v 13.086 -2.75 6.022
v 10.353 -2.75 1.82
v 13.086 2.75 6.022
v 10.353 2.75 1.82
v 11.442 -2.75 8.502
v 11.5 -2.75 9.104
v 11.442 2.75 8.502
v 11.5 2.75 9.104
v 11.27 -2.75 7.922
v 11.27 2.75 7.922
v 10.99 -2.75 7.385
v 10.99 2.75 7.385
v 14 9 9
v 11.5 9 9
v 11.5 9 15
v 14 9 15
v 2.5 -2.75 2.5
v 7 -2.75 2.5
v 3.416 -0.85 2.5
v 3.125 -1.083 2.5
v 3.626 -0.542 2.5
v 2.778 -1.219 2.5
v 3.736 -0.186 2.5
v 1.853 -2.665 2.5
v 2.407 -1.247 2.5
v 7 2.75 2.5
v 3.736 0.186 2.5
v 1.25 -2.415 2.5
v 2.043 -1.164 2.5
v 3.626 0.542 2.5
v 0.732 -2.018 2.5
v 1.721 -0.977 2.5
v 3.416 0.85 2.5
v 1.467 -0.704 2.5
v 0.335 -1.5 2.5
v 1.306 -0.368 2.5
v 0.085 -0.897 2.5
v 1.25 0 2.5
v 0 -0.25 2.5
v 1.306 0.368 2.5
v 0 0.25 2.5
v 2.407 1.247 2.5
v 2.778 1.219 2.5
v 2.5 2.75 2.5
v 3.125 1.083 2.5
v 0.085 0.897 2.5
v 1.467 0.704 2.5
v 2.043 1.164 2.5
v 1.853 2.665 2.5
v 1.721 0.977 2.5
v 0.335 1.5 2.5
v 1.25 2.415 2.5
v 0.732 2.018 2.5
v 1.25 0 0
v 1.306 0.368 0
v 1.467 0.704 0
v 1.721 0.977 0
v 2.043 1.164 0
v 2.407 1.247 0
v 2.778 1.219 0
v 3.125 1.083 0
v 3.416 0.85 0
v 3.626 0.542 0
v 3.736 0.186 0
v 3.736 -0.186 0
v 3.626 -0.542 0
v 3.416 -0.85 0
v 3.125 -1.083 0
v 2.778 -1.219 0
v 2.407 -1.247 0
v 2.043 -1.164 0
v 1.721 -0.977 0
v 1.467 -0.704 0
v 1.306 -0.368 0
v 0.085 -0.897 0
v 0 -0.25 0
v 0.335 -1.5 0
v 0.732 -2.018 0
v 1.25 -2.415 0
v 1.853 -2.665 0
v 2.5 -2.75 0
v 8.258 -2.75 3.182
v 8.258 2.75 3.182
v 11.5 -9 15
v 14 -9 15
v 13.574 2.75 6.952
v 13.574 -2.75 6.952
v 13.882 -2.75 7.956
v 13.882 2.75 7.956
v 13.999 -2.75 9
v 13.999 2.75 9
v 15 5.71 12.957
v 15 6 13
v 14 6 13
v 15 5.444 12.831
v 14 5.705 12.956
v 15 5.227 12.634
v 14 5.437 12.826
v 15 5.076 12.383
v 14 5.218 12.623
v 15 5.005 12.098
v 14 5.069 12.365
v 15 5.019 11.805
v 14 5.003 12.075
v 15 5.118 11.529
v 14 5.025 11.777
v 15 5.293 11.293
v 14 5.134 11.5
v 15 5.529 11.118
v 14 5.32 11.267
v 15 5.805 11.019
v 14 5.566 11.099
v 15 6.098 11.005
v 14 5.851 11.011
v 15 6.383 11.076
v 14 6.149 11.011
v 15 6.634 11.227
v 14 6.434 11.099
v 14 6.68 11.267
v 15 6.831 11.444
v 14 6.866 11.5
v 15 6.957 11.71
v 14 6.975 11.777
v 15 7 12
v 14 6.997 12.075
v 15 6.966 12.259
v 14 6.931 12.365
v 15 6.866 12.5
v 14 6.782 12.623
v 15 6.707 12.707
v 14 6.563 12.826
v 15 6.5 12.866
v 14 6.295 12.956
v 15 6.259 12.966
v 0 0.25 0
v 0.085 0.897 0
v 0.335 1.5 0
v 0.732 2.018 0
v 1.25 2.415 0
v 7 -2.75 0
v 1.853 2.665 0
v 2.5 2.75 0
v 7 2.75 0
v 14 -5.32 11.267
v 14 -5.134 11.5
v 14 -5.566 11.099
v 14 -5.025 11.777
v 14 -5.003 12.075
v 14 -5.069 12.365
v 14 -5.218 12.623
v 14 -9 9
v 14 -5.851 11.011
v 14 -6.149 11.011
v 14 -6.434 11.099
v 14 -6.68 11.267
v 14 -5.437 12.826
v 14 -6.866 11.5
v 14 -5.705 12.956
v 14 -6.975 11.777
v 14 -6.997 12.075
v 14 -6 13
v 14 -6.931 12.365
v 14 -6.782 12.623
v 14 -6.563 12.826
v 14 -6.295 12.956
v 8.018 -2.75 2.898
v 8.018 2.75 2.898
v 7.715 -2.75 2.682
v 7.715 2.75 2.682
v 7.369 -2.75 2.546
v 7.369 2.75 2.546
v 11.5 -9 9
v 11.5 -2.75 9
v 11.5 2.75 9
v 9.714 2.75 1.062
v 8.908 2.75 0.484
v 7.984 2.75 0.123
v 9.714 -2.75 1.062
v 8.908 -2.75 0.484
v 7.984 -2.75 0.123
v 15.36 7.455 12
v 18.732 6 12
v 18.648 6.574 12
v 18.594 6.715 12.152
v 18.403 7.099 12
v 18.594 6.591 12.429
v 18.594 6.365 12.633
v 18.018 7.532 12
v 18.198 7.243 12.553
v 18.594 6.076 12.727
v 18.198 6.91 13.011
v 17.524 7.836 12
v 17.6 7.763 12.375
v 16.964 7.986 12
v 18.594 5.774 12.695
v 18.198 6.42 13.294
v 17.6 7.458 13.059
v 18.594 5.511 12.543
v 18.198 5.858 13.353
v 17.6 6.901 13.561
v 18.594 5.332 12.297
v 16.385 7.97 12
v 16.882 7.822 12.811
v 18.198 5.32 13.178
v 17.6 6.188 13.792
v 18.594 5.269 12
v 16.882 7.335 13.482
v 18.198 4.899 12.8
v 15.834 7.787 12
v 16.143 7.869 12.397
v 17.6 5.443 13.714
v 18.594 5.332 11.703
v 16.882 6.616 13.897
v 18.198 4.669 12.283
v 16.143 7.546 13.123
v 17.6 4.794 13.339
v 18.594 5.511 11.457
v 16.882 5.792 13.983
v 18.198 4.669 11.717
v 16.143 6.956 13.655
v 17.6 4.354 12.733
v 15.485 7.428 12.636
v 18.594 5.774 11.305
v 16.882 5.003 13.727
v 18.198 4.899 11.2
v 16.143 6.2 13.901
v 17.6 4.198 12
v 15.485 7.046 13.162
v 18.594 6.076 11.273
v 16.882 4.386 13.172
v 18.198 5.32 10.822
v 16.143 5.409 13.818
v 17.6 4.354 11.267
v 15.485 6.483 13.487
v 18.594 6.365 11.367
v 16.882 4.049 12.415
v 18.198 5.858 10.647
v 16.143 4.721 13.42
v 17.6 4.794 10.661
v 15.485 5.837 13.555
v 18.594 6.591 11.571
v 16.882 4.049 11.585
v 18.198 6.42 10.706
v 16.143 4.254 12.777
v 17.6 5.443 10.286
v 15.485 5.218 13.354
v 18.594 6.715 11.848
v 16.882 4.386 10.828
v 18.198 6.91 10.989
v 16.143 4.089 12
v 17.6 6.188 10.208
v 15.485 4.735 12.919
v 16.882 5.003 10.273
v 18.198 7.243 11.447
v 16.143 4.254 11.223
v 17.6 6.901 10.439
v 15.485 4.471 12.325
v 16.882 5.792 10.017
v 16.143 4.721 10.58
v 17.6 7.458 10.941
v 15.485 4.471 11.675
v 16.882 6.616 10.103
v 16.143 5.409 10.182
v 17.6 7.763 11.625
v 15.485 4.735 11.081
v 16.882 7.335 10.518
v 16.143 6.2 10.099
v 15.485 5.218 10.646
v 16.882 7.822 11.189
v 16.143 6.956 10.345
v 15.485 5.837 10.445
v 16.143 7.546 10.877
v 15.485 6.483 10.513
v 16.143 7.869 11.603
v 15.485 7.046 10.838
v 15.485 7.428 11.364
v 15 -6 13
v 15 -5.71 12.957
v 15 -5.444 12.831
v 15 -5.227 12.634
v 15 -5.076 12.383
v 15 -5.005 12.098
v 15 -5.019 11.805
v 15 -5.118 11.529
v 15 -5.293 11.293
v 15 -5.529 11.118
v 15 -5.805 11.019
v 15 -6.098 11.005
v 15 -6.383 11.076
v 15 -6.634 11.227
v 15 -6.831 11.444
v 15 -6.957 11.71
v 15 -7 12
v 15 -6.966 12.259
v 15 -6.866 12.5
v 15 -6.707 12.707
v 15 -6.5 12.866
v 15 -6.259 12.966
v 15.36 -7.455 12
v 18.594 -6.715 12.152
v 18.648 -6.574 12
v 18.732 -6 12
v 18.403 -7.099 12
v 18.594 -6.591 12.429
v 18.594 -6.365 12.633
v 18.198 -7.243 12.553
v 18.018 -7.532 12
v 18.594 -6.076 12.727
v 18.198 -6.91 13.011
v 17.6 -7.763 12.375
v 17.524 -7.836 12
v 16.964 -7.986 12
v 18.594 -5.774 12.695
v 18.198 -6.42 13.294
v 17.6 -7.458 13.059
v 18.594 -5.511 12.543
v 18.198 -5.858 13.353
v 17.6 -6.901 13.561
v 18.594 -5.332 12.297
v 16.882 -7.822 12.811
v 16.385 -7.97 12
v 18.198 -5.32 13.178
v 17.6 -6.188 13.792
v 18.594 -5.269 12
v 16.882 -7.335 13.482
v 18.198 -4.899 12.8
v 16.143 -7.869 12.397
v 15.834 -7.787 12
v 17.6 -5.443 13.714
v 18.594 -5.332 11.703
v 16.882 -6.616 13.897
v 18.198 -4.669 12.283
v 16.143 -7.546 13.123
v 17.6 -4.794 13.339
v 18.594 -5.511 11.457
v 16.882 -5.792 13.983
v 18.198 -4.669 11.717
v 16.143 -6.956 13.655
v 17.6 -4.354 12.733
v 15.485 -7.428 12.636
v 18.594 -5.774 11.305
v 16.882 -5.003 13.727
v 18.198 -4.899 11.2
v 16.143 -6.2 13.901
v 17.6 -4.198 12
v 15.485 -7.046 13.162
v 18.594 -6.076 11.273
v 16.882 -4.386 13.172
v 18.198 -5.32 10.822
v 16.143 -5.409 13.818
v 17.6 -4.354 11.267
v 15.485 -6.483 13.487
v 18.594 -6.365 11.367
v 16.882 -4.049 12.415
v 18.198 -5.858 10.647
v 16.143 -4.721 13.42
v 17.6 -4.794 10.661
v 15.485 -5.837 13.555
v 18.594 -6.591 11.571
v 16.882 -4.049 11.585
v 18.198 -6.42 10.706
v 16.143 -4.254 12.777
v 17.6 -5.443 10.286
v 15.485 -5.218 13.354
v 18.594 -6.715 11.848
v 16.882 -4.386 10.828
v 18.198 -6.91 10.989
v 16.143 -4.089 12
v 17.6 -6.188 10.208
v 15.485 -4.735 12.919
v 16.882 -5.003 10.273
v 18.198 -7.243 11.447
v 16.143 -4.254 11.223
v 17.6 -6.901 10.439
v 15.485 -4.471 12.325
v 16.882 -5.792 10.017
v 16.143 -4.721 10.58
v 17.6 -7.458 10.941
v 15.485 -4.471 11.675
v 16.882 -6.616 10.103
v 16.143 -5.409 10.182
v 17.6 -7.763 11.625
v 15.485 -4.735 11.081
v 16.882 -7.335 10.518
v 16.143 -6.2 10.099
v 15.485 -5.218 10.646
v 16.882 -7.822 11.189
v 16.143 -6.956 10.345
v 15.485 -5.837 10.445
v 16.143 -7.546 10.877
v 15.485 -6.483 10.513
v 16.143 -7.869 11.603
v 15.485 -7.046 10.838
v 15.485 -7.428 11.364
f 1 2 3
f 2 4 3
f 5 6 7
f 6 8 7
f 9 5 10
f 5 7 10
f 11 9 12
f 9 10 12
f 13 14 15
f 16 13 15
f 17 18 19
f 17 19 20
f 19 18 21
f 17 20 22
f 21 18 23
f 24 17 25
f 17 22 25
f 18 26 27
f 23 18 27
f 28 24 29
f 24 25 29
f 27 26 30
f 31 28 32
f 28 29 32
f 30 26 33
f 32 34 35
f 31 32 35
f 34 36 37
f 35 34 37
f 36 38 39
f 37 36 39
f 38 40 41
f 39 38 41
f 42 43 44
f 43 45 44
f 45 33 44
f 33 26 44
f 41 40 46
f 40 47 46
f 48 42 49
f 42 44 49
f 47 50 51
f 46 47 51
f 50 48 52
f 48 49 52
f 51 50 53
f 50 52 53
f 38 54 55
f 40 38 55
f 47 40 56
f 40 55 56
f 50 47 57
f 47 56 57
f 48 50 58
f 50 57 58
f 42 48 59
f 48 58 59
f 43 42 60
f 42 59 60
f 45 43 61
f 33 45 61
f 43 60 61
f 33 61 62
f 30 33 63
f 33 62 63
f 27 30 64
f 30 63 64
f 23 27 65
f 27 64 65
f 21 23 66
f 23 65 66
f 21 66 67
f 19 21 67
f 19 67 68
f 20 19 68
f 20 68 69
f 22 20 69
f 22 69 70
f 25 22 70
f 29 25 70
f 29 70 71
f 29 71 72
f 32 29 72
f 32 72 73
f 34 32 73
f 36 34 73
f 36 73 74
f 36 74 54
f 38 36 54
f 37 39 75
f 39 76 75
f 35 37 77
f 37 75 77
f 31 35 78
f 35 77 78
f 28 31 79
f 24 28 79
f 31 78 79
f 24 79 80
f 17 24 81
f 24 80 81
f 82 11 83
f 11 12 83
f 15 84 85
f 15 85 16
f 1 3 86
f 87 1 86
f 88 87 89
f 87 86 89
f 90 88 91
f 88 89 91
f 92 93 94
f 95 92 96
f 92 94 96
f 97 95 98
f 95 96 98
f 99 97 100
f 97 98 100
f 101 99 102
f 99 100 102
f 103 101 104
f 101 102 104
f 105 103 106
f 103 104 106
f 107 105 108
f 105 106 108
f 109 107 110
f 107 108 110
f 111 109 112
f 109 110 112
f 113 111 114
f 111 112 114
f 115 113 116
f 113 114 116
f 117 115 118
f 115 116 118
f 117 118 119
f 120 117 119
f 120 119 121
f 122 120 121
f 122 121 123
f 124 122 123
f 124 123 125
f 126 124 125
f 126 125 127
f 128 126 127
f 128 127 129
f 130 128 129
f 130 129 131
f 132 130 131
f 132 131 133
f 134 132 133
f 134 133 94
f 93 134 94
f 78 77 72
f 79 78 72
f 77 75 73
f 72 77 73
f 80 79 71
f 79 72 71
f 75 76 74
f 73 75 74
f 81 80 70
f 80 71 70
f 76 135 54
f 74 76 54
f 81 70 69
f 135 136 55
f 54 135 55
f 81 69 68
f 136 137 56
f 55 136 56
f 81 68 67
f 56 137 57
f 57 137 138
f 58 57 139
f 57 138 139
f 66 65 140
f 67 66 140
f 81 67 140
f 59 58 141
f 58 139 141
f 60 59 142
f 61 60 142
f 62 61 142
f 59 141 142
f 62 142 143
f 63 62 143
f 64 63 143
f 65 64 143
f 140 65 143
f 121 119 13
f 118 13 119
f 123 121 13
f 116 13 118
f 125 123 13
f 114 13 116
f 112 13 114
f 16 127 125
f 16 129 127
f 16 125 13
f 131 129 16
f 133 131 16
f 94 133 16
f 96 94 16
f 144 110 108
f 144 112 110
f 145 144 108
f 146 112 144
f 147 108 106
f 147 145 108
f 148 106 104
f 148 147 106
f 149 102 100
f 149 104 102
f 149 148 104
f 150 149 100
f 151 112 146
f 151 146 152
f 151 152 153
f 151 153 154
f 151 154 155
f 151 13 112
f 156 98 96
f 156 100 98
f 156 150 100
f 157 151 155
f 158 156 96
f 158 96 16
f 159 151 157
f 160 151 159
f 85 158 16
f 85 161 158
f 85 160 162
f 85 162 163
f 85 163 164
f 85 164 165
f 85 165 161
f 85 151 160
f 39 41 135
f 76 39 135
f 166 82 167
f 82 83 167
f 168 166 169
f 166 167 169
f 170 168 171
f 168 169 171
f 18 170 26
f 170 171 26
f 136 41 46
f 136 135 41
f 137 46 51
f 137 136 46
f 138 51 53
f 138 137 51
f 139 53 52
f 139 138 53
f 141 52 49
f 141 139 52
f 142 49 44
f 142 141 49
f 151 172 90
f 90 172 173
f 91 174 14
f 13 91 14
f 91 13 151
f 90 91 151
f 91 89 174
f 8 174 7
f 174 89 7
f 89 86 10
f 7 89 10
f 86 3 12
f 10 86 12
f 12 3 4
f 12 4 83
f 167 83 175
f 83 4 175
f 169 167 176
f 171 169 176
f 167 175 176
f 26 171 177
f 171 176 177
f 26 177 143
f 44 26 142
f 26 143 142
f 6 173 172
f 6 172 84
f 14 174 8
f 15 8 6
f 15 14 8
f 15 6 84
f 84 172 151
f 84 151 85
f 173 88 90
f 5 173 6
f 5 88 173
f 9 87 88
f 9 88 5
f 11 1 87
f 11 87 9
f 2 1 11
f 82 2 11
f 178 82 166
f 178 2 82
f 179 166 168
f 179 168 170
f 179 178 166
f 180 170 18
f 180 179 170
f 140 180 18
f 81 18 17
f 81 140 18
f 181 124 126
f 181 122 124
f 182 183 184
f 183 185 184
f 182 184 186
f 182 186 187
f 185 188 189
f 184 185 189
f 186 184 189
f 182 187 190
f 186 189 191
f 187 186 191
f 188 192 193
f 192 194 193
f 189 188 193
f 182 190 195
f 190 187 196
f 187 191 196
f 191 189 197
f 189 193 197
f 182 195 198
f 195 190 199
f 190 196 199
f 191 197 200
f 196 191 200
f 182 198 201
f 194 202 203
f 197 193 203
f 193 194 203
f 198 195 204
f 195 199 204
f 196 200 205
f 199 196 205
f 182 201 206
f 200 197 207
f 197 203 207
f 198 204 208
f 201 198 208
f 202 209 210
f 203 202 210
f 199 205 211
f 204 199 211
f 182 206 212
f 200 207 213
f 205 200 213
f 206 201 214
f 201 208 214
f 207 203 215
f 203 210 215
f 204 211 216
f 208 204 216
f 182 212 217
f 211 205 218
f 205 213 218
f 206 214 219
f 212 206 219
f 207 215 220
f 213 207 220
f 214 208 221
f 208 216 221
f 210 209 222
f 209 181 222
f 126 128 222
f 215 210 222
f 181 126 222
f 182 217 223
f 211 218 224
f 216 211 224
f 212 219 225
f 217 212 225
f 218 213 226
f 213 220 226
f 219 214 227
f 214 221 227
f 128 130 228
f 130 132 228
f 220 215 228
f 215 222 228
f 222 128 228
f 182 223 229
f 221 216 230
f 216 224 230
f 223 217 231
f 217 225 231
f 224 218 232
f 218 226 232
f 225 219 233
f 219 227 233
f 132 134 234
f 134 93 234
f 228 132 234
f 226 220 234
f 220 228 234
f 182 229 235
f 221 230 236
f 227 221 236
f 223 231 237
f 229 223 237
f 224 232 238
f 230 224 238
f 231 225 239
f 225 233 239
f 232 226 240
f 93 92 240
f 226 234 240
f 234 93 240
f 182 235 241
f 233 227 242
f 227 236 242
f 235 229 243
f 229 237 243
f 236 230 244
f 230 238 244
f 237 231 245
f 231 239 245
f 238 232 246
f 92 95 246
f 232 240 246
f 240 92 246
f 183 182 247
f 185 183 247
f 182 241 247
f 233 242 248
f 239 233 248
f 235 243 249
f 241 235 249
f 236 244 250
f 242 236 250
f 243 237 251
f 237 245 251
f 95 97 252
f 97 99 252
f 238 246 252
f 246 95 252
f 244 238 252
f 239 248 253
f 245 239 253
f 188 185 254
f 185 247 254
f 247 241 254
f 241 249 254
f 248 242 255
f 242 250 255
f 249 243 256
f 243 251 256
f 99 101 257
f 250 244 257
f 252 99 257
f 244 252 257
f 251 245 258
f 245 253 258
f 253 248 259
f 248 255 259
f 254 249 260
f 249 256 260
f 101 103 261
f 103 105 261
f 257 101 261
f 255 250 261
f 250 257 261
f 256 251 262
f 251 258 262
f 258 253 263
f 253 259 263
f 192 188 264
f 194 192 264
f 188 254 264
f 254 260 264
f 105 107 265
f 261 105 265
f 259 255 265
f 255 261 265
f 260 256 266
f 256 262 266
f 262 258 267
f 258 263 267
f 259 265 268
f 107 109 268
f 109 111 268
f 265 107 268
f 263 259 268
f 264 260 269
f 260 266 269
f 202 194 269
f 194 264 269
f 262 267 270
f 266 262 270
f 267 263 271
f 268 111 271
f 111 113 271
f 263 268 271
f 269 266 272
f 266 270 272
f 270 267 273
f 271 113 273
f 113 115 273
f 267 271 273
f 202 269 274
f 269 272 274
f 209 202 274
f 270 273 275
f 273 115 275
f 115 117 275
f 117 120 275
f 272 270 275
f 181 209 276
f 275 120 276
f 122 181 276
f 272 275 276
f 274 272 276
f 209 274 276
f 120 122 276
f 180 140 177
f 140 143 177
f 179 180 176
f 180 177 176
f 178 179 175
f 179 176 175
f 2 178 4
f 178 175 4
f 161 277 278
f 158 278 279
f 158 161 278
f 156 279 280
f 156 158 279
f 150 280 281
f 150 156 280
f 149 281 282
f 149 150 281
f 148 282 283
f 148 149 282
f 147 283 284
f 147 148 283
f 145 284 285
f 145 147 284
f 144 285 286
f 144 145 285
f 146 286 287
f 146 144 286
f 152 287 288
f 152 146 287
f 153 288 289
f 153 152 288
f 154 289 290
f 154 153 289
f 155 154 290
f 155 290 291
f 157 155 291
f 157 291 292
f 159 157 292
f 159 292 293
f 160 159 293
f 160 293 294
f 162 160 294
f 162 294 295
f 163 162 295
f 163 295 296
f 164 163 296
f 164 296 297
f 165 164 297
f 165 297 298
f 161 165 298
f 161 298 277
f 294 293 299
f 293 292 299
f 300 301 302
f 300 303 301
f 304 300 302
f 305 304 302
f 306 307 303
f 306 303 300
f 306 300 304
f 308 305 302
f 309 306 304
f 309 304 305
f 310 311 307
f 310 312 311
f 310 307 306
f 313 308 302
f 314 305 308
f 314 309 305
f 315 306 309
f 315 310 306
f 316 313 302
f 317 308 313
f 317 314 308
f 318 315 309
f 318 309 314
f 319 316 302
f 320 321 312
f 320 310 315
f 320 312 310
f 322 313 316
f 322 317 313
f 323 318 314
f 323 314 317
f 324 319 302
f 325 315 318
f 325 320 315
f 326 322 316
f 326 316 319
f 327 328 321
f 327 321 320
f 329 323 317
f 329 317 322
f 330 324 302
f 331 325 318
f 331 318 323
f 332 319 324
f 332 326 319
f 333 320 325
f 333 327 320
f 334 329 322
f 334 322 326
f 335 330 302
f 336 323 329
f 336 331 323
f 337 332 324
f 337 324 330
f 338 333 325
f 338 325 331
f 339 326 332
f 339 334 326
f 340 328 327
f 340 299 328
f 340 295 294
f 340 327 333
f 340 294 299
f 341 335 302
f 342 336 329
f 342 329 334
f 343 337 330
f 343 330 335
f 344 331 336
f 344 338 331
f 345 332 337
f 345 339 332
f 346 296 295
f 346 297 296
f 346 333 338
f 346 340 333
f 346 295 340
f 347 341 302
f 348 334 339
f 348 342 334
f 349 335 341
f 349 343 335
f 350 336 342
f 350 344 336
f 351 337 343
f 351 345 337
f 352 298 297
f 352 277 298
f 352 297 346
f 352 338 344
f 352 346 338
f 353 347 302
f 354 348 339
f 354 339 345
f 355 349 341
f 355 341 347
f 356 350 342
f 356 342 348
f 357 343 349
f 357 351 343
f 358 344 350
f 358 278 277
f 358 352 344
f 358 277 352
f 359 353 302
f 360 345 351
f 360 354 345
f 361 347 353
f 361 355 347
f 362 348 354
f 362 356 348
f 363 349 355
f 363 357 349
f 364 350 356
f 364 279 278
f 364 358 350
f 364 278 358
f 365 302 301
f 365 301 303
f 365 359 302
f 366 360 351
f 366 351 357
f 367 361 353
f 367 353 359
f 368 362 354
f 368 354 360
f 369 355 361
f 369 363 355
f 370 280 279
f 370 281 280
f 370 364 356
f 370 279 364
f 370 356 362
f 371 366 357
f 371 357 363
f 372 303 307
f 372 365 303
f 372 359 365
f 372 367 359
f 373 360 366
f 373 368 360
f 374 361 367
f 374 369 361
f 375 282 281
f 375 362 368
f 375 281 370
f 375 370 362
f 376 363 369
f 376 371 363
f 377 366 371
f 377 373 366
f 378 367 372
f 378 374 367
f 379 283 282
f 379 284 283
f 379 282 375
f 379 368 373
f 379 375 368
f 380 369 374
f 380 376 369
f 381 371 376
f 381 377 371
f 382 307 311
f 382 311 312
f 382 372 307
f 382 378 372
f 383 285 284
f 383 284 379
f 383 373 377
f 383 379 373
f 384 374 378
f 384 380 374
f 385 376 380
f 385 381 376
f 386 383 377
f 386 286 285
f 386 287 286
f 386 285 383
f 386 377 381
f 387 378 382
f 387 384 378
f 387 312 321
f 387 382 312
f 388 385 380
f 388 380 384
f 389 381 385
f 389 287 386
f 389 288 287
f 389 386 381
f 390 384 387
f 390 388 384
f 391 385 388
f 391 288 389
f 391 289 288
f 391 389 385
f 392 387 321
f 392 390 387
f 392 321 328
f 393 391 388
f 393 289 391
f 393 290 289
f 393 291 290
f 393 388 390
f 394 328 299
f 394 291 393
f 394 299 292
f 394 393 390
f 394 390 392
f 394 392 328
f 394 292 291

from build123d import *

# Parameters (mm, degrees)
EXTRUDE_1_DEPTH     = 2.75
SKETCH_2_R          = 1.25
CUT_EXTRUDE_1_DEPTH = 10
FILLET_2_R          = 2.5
EXTRUDE_2_REACH     = 21.1
SKETCH_4_W          = 6
SKETCH_4_H          = 18
SKETCH_5_R          = 1
EXTRUDE_3_DEPTH     = 1


with BuildPart() as part:
    # 草图1 → 凸台-拉伸1 (new, symmetric)
    with BuildSketch(Plane(origin=(0, 0, 0), x_dir=(1, 0, 0), z_dir=(0, 1, 0))):
        with BuildLine():
            Line((0, 0), (7, 0))
            ThreePointArc((7, 0), (8.907645559, -0.484194485), (10.353455389, -1.819555789))
            Line((10.353455389, -1.819555789), (13.08620622, -6.022441585))
            ThreePointArc((13.08620622, -6.022441585), (13.76673936, -7.496994372), (14, -9.104172255))
            Line((14, -9.104172255), (14, -15))
            Line((14, -15), (11.5, -15))
            Line((11.5, -15), (11.5, -9.104172255))
            ThreePointArc((11.5, -9.104172255), (11.369889965, -8.207707378), (10.990296602, -7.385219216))
            Line((10.990296602, -7.385219216), (8.257545771, -3.182333421))
            ThreePointArc((8.257545771, -3.182333421), (7.715367085, -2.681572932), (7, -2.5))
            Line((7, -2.5), (0, -2.5))
            Line((0, -2.5), (0, 0))
        make_face()
    extrude(amount=EXTRUDE_1_DEPTH, both=True)

    # 草图2 → 切除-拉伸1 (cut)
    with BuildSketch(Plane(origin=(0, 0, 0), x_dir=(-1, 0, 0), z_dir=(0, 0, -1))):
        with Locations((-2.5, 0)):
            Circle(SKETCH_2_R)
    extrude(amount=-CUT_EXTRUDE_1_DEPTH, mode=Mode.SUBTRACT)

    # 圆角2
    fillet_2_edges = [part.edges().sort_by_distance(p)[0] for p in [
        (0, -2.75, 1.25),
        (0, 2.75, 1.25),
    ]]
    fillet(fillet_2_edges, radius=FILLET_2_R)

    # 凸台-拉伸2: up to this face of the body (flat: up to its plane)
    extrude_2_end = Plane(part.part.faces().sort_by_distance((14, 0, 12.052086128))[0])
    # 草图4 → 凸台-拉伸2 (add, up to the picked face)
    with BuildSketch(Plane.ZY.offset(-11.5), mode=Mode.PRIVATE) as extrude_2_sk1:
        with Locations((12, 0)):
            Rectangle(SKETCH_4_W, SKETCH_4_H)
    extrude_2_tool1 = split(extrude(extrude_2_sk1.sketch, amount=-EXTRUDE_2_REACH, mode=Mode.PRIVATE), bisect_by=extrude_2_end, keep=Keep.BOTH, mode=Mode.PRIVATE)
    add(extrude_2_tool1.solids().sort_by(Axis((11.5, 0, 12), (1, 0, 0)))[0])

    # 草图5 → 凸台-拉伸3 (add)
    with BuildSketch(Plane(origin=(14, 0, 0), x_dir=(0, 0, -1), z_dir=(1, 0, 0))):
        with Locations(Location((-12, 6, 0), (0, 0, 180))):
            Circle(SKETCH_5_R)
    extrude_3 = extrude(amount=EXTRUDE_3_DEPTH)

    # 草图6 → 旋转1 (revolve)
    with BuildSketch(Plane(origin=(0, 0, 12), x_dir=(-1, 0, 0), z_dir=(0, 0, -1))):
        with BuildLine():
            Line((-15, 6), (-18.732050808, 6))
            ThreePointArc((-18.732050808, 6), (-17.249688898, 7.931851653), (-15, 7))
            Line((-15, 7), (-15, 6))
        make_face()
    revolve_1 = revolve(axis=Axis((15, 6, 12), (1, 0, 0)))

    # 镜向1: 凸台-拉伸3, 旋转1 across plane
    add(extrude_3.mirror(Plane.ZX))
    add(revolve_1.mirror(Plane.ZX))


solid = part.part
